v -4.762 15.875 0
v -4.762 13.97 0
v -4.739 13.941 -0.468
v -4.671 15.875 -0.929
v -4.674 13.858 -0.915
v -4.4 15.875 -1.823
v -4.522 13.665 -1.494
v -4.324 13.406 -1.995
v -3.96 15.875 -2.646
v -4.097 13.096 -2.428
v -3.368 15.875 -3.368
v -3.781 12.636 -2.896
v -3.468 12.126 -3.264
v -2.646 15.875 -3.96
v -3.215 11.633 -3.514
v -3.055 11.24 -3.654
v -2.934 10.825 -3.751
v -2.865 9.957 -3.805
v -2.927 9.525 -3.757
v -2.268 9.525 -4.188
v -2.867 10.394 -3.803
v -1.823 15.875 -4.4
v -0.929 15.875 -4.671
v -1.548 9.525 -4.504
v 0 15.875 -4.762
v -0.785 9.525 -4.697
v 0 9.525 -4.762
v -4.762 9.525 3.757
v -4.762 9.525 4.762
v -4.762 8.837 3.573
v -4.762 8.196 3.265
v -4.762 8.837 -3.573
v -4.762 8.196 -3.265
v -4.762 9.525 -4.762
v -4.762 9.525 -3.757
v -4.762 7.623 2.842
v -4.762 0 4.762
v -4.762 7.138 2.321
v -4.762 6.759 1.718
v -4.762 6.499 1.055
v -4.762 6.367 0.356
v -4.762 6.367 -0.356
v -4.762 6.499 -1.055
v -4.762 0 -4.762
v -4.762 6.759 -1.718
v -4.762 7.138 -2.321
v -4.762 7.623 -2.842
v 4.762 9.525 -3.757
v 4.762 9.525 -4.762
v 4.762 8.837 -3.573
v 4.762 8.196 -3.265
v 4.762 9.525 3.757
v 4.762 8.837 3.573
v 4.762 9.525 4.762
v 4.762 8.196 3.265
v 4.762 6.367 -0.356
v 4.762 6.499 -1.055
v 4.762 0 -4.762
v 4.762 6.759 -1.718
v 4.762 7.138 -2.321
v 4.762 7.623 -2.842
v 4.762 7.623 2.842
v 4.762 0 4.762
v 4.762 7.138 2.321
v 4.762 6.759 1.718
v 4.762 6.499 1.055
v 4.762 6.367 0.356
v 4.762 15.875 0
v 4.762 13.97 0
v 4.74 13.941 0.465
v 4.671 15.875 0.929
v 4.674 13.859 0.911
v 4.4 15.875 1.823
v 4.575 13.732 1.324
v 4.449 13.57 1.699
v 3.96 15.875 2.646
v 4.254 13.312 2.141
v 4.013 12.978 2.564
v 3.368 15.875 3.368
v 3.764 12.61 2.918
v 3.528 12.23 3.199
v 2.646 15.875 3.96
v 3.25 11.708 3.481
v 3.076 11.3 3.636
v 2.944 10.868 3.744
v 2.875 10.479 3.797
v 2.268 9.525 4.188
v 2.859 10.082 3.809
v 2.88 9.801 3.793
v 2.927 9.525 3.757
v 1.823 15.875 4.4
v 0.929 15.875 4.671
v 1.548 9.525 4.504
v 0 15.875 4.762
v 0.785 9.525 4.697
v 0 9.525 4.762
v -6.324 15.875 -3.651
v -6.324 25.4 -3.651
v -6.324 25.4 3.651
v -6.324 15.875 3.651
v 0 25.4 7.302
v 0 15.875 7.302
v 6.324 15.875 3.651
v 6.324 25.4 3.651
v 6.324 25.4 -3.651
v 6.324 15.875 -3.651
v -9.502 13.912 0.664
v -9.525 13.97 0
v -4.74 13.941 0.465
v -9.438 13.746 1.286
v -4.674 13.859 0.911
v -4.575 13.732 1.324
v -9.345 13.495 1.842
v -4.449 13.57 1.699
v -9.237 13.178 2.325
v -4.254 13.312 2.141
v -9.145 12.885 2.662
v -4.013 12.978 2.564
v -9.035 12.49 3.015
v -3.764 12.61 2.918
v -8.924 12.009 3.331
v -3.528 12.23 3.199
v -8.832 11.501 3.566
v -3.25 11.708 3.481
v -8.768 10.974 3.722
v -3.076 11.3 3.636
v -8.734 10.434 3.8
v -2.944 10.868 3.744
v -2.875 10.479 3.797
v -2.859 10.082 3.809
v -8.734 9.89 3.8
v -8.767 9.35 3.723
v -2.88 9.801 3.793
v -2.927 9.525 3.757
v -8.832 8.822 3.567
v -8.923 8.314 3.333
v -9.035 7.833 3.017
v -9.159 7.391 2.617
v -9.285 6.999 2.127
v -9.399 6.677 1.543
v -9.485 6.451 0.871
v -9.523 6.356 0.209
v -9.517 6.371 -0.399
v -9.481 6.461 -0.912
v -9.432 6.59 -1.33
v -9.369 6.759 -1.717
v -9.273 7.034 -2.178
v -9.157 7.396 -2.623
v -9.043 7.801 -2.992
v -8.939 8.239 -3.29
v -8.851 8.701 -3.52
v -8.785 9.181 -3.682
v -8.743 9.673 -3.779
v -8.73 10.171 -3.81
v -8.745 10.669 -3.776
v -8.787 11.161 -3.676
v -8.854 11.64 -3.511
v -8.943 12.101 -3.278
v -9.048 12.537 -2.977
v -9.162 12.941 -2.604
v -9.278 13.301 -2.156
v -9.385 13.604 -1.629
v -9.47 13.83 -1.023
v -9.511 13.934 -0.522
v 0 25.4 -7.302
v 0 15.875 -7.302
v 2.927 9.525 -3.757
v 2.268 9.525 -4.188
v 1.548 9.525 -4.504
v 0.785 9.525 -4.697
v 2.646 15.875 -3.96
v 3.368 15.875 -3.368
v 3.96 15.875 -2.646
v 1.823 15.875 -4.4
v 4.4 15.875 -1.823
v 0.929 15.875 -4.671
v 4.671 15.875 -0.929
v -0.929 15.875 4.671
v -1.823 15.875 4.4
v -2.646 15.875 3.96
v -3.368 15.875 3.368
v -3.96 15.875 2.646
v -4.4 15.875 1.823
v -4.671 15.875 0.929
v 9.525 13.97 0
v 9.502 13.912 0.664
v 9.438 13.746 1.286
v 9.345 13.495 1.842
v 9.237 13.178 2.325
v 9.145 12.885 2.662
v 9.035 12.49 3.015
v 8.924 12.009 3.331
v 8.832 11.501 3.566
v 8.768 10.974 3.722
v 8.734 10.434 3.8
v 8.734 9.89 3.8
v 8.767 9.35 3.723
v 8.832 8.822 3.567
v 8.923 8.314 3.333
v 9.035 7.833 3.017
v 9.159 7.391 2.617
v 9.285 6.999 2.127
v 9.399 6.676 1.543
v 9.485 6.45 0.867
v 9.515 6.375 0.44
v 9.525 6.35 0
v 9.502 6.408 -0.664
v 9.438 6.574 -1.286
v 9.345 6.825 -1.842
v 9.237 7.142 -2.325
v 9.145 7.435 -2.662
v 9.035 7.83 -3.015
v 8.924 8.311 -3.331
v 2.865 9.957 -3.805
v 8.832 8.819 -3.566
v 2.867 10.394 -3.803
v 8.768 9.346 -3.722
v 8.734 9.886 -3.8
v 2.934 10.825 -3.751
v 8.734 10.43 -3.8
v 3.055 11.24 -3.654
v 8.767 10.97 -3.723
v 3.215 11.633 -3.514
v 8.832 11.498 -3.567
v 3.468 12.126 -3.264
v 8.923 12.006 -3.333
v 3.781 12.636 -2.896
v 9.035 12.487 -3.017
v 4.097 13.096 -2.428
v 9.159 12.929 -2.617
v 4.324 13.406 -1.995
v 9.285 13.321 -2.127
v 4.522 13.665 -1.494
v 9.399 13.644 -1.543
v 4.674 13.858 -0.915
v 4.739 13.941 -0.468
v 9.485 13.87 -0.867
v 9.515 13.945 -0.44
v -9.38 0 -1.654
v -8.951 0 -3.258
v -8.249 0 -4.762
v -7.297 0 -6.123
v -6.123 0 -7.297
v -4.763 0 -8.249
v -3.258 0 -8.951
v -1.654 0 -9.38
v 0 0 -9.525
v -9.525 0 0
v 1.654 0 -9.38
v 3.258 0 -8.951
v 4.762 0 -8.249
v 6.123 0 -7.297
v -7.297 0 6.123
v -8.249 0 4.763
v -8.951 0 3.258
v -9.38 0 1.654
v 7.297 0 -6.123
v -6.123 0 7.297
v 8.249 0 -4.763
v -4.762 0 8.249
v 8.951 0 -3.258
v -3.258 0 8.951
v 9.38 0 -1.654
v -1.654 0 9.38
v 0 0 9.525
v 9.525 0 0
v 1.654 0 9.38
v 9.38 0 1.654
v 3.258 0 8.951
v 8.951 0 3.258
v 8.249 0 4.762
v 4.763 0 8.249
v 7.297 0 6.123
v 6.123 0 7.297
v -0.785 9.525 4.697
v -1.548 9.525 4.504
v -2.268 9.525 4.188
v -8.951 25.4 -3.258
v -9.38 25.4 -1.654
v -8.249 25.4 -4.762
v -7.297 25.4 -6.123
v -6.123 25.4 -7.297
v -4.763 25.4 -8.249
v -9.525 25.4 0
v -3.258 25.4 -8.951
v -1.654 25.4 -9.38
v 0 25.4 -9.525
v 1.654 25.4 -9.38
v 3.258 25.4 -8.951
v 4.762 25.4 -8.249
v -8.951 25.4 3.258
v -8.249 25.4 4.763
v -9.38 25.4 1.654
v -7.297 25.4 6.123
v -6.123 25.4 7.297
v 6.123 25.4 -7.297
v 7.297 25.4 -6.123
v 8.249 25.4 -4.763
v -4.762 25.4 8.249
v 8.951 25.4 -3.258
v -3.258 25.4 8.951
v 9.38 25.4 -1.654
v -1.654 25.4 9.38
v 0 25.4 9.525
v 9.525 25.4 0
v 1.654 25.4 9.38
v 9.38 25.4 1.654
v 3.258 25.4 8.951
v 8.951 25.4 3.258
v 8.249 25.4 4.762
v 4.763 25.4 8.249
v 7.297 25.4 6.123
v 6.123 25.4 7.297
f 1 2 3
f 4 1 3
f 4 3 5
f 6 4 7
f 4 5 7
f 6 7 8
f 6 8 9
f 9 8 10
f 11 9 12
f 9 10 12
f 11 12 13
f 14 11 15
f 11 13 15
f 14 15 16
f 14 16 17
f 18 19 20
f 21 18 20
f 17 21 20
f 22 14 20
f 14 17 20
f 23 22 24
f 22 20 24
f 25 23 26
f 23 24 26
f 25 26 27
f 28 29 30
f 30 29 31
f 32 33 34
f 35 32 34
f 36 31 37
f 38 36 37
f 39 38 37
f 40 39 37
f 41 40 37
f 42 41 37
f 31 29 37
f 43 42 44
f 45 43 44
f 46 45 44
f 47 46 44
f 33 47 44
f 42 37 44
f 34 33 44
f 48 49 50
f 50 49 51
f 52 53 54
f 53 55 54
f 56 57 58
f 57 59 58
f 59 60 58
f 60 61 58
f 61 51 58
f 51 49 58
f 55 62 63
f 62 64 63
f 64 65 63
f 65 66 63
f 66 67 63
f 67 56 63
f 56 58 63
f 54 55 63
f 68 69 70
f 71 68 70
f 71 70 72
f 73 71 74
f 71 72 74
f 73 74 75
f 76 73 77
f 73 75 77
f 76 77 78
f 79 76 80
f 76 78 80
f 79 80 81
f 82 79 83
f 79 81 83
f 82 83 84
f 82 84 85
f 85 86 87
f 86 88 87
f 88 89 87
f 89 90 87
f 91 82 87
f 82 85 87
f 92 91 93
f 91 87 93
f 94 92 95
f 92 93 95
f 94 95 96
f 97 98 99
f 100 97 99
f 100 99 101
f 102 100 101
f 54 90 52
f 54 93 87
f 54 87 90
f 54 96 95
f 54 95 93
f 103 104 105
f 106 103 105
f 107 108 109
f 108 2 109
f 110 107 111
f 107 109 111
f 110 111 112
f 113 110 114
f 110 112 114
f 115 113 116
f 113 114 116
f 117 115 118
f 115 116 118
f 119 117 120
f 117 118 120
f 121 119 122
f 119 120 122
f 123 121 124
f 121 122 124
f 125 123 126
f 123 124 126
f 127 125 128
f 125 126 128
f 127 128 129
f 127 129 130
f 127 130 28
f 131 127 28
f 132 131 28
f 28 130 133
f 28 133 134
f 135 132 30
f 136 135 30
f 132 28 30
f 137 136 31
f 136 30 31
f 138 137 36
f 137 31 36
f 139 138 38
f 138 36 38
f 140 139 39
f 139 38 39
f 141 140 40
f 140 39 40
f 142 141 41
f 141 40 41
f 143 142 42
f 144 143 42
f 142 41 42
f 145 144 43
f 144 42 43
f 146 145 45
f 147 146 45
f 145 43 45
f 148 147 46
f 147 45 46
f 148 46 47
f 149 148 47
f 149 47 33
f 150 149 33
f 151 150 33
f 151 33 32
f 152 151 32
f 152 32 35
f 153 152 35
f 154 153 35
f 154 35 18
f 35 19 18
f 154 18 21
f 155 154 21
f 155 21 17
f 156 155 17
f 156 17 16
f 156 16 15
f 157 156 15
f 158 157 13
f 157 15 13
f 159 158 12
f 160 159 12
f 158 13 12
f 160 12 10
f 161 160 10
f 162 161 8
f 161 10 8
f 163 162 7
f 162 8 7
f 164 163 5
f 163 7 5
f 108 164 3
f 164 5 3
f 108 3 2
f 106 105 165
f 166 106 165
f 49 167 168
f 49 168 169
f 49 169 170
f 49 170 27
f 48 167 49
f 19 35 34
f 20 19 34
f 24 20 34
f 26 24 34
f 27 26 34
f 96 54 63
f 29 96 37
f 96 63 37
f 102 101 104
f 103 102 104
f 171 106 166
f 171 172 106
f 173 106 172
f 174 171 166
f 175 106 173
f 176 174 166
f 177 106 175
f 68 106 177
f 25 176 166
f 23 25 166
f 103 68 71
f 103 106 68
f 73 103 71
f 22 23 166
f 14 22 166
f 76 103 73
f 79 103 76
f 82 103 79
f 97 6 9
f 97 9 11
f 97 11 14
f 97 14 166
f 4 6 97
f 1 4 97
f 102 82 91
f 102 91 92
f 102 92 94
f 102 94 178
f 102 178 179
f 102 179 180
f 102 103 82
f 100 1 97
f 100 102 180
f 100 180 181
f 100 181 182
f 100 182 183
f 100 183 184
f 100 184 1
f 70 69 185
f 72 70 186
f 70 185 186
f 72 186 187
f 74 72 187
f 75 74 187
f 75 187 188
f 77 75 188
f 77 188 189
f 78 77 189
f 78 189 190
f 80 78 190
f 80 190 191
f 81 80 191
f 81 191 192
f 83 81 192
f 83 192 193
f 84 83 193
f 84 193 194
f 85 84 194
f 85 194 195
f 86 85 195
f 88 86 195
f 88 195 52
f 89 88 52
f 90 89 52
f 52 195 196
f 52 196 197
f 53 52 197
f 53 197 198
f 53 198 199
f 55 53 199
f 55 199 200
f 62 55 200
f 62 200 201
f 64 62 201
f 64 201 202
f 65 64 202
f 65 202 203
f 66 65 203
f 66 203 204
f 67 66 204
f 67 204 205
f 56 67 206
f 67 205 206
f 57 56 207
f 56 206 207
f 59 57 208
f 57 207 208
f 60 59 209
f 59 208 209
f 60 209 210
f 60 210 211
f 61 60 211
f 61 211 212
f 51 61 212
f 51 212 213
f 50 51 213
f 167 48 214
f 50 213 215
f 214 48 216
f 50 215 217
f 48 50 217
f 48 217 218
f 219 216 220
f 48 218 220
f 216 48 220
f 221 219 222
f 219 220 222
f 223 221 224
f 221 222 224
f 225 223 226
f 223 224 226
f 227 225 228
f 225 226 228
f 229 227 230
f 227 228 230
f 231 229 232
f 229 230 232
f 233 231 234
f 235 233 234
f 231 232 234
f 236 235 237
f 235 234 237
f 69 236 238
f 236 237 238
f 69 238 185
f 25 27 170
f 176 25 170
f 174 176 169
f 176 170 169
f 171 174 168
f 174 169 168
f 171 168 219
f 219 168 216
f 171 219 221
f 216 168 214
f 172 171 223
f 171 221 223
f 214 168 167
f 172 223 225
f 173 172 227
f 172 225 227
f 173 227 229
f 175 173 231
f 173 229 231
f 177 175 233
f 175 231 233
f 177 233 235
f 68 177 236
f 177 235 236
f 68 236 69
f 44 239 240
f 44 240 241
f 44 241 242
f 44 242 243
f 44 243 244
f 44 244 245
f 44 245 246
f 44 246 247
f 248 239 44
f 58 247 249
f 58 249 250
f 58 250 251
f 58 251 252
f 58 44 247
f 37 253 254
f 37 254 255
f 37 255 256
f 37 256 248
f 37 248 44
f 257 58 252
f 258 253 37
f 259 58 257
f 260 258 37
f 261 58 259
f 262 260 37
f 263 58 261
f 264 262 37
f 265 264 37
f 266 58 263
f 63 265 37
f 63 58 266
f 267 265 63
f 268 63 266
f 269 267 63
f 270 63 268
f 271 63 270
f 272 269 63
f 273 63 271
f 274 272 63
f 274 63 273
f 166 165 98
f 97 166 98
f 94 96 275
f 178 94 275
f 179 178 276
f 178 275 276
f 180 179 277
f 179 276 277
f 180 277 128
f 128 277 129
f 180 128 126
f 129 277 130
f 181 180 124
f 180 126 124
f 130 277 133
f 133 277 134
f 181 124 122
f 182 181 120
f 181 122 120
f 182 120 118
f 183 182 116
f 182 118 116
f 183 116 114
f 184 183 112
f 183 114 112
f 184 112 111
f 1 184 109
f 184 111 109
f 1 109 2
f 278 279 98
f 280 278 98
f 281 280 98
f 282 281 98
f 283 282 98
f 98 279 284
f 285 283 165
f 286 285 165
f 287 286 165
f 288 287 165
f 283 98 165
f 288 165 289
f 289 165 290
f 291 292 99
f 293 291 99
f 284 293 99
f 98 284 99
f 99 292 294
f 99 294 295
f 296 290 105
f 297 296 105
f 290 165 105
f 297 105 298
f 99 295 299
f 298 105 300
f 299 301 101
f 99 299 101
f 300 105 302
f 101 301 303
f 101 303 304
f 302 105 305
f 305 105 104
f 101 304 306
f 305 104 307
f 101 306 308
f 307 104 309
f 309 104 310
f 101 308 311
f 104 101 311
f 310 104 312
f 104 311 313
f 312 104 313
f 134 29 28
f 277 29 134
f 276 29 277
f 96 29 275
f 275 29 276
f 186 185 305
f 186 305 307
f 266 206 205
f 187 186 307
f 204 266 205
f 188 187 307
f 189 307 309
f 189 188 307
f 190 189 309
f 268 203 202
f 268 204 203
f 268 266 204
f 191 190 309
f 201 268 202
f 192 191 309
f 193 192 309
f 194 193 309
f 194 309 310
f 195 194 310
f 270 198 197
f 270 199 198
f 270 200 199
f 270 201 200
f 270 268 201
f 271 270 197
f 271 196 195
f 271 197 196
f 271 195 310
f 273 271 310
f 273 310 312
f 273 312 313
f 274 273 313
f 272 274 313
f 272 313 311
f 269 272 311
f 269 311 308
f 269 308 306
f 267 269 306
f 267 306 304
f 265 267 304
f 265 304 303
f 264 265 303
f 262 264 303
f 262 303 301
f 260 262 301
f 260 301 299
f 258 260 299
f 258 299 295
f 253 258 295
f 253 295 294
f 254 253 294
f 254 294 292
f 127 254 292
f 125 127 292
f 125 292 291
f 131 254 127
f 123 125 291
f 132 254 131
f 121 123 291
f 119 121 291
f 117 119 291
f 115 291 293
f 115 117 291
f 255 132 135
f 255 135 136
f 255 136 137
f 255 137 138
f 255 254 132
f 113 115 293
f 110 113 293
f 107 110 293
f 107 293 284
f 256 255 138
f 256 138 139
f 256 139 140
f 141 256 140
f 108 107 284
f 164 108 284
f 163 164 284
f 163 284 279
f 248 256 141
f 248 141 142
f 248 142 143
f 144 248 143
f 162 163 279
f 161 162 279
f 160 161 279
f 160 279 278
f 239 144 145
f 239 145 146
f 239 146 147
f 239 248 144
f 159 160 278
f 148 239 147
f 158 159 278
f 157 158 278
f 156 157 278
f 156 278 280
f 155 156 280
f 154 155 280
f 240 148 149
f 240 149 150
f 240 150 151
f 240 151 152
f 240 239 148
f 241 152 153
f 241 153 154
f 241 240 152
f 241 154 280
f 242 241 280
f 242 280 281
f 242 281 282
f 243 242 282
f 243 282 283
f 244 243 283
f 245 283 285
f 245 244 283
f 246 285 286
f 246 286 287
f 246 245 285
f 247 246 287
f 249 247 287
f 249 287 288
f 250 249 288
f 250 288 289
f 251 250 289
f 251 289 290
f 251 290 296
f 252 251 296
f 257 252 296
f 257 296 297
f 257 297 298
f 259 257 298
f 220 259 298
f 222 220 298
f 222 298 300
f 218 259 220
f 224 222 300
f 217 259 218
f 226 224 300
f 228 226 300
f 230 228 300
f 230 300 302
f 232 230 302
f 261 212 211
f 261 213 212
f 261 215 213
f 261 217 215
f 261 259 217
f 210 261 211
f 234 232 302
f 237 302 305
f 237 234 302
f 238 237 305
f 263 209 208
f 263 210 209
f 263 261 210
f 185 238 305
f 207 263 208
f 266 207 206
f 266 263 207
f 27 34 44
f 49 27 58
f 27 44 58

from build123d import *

# Parameters (mm, degrees)
F0_R     = 9.525
F1_DEPTH = 25.4
F3_DEPTH = 25.401
F4_DEPTH = 9.525
F6_DEPTH = 9.525
F7_R     = 3.81
F8_DEPTH = 12.7


with BuildPart() as f1:
    # F0 (on Front) → F1 (new body)
    with BuildSketch(Plane.XZ):
        Circle(F0_R)
    extrude(amount=-F1_DEPTH)

    # F2 (on face) → F3 (cut, through all)
    with BuildSketch(Plane.XZ):
        with BuildLine():
            ThreePointArc((4.7625, 0), (3.367596, 3.367596), (0, 4.7625))
            ThreePointArc((0, 4.7625), (-3.367596, 3.367596), (-4.7625, 0))
            ThreePointArc((-4.7625, 0), (-3.367596, -3.367596), (0, -4.7625))
            ThreePointArc((0, -4.7625), (3.367596, -3.367596), (4.7625, 0))
        make_face()
    extrude(amount=-F3_DEPTH, mode=Mode.SUBTRACT)

    # F2 (on face) → F4 (cut)
    with BuildSketch(Plane.XZ):
        with BuildLine():
            Line((4.7625, 0), (4.7625, 4.7625))
            Line((4.7625, 4.7625), (0, 4.7625))
            ThreePointArc((0, 4.7625), (3.367596, 3.367596), (4.7625, 0))
        make_face()
        with BuildLine():
            ThreePointArc((-4.7625, 0), (-3.367596, 3.367596), (0, 4.7625))
            Line((0, 4.7625), (-4.7625, 4.7625))
            Line((-4.7625, 4.7625), (-4.7625, 0))
        make_face()
        with BuildLine():
            Line((4.7625, -4.7625), (4.7625, 0))
            ThreePointArc((4.7625, 0), (3.367596, -3.367596), (0, -4.7625))
            Line((0, -4.7625), (4.7625, -4.7625))
        make_face()
        with BuildLine():
            ThreePointArc((0, -4.7625), (-3.367596, -3.367596), (-4.7625, 0))
            Line((-4.7625, 0), (-4.7625, -4.7625))
            Line((-4.7625, -4.7625), (0, -4.7625))
        make_face()
    extrude(amount=-F4_DEPTH, mode=Mode.SUBTRACT)

    # F5 (on face) → F6 (cut)
    with BuildSketch(Plane(origin=(0, 25.4, 0), x_dir=(-1, 0, 0), z_dir=(0, 1, 0))):
        Polygon((-6.324151, 3.65125), (-6.324151, -3.65125), (0, -7.3025), (6.324151, -3.65125), (6.324151, 3.65125), (0, 7.3025), align=None)
    extrude(amount=-F6_DEPTH, mode=Mode.SUBTRACT)

    # F7 (on Right) → F8 (cut, symmetric)
    with BuildSketch(Plane.YZ):
        with Locations((10.16, 0)):
            Circle(F7_R)
    extrude(amount=F8_DEPTH, both=True, mode=Mode.SUBTRACT)


solid = f1.part
